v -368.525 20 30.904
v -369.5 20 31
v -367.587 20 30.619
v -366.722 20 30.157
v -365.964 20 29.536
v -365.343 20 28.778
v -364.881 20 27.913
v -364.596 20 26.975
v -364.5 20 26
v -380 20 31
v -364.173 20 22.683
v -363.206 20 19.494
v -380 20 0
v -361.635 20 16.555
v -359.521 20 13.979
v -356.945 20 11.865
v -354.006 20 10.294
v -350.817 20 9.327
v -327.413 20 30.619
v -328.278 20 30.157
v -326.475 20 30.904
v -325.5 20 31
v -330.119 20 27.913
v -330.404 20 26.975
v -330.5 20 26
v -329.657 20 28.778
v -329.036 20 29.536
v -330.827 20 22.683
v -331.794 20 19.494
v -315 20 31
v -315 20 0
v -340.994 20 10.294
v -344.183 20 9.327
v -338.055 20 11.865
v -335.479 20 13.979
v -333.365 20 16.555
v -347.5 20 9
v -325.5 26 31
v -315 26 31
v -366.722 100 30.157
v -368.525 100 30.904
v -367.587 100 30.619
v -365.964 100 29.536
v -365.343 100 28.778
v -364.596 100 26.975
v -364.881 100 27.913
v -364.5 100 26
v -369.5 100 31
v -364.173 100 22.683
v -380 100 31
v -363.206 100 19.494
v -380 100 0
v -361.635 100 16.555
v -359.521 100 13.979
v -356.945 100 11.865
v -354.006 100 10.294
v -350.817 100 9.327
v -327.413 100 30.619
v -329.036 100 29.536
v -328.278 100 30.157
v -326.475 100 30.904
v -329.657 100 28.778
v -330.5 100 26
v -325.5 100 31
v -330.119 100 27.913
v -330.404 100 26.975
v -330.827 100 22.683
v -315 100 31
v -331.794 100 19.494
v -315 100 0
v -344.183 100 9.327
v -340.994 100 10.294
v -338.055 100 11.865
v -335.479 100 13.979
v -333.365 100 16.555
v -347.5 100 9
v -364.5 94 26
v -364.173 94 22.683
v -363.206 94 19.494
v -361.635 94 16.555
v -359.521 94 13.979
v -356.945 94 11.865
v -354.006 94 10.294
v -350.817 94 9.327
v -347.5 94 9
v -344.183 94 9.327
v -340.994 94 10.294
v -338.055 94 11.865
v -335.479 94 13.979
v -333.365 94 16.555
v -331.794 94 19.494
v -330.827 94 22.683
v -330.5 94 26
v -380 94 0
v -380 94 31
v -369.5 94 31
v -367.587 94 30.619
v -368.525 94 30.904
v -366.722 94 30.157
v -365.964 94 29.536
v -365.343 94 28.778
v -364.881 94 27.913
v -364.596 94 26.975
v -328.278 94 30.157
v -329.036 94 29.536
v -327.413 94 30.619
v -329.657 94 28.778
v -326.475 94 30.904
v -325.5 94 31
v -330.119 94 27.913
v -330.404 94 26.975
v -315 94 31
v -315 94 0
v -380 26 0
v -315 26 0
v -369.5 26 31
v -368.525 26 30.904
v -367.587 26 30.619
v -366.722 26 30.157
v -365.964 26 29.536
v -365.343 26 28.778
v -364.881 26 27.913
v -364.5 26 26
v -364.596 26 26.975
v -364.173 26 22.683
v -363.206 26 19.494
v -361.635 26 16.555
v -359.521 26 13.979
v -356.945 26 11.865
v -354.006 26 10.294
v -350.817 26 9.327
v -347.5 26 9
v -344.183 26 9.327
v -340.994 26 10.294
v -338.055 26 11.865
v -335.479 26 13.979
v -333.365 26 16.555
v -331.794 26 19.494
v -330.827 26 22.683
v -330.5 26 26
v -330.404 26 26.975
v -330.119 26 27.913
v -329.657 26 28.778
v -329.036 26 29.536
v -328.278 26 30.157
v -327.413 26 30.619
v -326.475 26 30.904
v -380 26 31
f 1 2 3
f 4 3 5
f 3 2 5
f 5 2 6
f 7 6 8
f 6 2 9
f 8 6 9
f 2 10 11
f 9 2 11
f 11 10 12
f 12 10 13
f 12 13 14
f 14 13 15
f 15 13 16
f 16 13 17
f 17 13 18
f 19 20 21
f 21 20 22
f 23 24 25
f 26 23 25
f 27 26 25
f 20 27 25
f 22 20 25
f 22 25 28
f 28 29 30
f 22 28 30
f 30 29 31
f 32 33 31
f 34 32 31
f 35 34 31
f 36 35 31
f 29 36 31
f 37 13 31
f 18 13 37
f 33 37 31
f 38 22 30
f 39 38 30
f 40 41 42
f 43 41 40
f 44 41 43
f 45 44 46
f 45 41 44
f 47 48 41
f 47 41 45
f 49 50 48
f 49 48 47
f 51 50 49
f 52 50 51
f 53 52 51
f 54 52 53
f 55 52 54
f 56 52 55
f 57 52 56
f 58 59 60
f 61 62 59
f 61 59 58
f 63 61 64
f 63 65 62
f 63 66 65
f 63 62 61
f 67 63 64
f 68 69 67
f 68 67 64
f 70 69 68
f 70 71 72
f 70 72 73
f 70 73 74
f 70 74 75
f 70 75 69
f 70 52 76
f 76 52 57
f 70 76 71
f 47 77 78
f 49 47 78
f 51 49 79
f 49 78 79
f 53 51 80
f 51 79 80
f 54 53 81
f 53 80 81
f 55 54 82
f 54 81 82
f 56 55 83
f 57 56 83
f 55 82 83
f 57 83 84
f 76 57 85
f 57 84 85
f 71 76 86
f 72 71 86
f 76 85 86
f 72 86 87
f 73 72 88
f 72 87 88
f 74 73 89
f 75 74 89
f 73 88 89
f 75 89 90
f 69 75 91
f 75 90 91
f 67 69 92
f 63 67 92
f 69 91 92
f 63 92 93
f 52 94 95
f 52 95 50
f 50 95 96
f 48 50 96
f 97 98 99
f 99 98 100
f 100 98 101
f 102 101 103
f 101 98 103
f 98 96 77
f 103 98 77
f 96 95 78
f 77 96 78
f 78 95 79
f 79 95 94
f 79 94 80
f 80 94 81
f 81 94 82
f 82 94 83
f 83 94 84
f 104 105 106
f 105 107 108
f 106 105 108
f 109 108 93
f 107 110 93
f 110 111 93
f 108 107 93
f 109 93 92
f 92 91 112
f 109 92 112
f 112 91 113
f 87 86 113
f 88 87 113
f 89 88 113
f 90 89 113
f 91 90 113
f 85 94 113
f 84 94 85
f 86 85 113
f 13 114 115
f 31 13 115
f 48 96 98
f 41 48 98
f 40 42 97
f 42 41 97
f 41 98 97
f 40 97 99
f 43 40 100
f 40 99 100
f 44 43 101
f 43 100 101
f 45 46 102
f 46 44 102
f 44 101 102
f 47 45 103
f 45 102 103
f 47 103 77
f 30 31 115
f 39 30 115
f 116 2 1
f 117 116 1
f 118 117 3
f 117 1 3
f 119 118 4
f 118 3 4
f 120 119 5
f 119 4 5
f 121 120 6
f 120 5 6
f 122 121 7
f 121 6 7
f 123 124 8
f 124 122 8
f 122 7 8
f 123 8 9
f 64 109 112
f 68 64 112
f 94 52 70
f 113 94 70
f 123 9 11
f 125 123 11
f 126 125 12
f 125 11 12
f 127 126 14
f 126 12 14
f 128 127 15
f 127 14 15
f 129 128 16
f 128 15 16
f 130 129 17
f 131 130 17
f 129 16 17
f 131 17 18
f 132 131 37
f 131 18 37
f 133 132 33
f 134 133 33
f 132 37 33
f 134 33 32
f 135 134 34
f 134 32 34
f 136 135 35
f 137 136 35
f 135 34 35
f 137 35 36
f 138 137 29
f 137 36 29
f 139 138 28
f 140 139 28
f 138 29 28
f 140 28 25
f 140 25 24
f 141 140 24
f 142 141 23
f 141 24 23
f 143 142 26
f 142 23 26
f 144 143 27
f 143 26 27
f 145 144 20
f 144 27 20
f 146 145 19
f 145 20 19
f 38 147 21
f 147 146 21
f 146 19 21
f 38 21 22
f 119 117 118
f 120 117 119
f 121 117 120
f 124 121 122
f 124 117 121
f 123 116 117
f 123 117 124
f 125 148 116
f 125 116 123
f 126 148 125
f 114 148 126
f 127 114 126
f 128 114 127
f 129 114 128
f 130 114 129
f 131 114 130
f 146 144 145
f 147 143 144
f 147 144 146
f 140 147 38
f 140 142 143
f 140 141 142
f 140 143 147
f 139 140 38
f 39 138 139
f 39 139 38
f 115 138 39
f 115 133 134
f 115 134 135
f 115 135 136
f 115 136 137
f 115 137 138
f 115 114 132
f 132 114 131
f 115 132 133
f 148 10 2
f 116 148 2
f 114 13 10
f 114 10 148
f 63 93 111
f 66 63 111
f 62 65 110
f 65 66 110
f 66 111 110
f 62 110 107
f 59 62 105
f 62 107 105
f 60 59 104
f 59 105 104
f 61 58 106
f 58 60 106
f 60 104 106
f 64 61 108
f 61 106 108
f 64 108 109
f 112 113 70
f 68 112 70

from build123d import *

# Parameters (mm, degrees)
SKETCH1_W             = 65
SKETCH1_H             = 6
BOSS_EXTRUDE1_DEPTH   = 46
BOSS_EXTRUDE1_2_DEPTH = 46
CUT_EXTRUDE4_DEPTH    = 81


with BuildPart() as part:
    # Sketch1 → Boss-Extrude1 (new body)
    with BuildSketch(Plane.XY):
        with Locations((-347.5, 23)):
            Rectangle(SKETCH1_W, SKETCH1_H)
    extrude(amount=BOSS_EXTRUDE1_DEPTH)


with BuildPart() as body_2:
    # Sketch1 → Boss-Extrude1 2 (new body)
    with BuildSketch(Plane.XY):
        with Locations((-347.5, 97)):
            Rectangle(SKETCH1_W, SKETCH1_H)
    extrude(amount=BOSS_EXTRUDE1_2_DEPTH)


with BuildPart() as cut_extrude4_tool:
    # Sketch4 → Cut-Extrude4 (new body, through all)
    with BuildSketch(Plane(origin=(0, 20, 0), x_dir=(-1, 0, 0), z_dir=(0, -1, 0))):
        with BuildLine():
            Line((315, -31), (315, -46))
            Line((315, -46), (380, -46))
            Line((380, -46), (380, -31))
            Line((380, -31), (369.5, -31))
            ThreePointArc((369.5, -31), (365.964466094, -29.535533906), (364.5, -26))
            ThreePointArc((364.5, -26), (347.5, -9), (330.5, -26))
            ThreePointArc((330.5, -26), (329.035533906, -29.535533906), (325.5, -31))
            Line((325.5, -31), (315, -31))
        make_face()
    extrude(amount=-CUT_EXTRUDE4_DEPTH)


with BuildPart() as part_1:
    add(part.part)

    # Cut-Extrude4: cut by cut_extrude4_tool
    add(cut_extrude4_tool.part, mode=Mode.SUBTRACT)


with BuildPart() as body_2_1:
    add(body_2.part)

    # Cut-Extrude4: cut by cut_extrude4_tool
    add(cut_extrude4_tool.part, mode=Mode.SUBTRACT)


solid = Compound([part_1.part, body_2_1.part])
